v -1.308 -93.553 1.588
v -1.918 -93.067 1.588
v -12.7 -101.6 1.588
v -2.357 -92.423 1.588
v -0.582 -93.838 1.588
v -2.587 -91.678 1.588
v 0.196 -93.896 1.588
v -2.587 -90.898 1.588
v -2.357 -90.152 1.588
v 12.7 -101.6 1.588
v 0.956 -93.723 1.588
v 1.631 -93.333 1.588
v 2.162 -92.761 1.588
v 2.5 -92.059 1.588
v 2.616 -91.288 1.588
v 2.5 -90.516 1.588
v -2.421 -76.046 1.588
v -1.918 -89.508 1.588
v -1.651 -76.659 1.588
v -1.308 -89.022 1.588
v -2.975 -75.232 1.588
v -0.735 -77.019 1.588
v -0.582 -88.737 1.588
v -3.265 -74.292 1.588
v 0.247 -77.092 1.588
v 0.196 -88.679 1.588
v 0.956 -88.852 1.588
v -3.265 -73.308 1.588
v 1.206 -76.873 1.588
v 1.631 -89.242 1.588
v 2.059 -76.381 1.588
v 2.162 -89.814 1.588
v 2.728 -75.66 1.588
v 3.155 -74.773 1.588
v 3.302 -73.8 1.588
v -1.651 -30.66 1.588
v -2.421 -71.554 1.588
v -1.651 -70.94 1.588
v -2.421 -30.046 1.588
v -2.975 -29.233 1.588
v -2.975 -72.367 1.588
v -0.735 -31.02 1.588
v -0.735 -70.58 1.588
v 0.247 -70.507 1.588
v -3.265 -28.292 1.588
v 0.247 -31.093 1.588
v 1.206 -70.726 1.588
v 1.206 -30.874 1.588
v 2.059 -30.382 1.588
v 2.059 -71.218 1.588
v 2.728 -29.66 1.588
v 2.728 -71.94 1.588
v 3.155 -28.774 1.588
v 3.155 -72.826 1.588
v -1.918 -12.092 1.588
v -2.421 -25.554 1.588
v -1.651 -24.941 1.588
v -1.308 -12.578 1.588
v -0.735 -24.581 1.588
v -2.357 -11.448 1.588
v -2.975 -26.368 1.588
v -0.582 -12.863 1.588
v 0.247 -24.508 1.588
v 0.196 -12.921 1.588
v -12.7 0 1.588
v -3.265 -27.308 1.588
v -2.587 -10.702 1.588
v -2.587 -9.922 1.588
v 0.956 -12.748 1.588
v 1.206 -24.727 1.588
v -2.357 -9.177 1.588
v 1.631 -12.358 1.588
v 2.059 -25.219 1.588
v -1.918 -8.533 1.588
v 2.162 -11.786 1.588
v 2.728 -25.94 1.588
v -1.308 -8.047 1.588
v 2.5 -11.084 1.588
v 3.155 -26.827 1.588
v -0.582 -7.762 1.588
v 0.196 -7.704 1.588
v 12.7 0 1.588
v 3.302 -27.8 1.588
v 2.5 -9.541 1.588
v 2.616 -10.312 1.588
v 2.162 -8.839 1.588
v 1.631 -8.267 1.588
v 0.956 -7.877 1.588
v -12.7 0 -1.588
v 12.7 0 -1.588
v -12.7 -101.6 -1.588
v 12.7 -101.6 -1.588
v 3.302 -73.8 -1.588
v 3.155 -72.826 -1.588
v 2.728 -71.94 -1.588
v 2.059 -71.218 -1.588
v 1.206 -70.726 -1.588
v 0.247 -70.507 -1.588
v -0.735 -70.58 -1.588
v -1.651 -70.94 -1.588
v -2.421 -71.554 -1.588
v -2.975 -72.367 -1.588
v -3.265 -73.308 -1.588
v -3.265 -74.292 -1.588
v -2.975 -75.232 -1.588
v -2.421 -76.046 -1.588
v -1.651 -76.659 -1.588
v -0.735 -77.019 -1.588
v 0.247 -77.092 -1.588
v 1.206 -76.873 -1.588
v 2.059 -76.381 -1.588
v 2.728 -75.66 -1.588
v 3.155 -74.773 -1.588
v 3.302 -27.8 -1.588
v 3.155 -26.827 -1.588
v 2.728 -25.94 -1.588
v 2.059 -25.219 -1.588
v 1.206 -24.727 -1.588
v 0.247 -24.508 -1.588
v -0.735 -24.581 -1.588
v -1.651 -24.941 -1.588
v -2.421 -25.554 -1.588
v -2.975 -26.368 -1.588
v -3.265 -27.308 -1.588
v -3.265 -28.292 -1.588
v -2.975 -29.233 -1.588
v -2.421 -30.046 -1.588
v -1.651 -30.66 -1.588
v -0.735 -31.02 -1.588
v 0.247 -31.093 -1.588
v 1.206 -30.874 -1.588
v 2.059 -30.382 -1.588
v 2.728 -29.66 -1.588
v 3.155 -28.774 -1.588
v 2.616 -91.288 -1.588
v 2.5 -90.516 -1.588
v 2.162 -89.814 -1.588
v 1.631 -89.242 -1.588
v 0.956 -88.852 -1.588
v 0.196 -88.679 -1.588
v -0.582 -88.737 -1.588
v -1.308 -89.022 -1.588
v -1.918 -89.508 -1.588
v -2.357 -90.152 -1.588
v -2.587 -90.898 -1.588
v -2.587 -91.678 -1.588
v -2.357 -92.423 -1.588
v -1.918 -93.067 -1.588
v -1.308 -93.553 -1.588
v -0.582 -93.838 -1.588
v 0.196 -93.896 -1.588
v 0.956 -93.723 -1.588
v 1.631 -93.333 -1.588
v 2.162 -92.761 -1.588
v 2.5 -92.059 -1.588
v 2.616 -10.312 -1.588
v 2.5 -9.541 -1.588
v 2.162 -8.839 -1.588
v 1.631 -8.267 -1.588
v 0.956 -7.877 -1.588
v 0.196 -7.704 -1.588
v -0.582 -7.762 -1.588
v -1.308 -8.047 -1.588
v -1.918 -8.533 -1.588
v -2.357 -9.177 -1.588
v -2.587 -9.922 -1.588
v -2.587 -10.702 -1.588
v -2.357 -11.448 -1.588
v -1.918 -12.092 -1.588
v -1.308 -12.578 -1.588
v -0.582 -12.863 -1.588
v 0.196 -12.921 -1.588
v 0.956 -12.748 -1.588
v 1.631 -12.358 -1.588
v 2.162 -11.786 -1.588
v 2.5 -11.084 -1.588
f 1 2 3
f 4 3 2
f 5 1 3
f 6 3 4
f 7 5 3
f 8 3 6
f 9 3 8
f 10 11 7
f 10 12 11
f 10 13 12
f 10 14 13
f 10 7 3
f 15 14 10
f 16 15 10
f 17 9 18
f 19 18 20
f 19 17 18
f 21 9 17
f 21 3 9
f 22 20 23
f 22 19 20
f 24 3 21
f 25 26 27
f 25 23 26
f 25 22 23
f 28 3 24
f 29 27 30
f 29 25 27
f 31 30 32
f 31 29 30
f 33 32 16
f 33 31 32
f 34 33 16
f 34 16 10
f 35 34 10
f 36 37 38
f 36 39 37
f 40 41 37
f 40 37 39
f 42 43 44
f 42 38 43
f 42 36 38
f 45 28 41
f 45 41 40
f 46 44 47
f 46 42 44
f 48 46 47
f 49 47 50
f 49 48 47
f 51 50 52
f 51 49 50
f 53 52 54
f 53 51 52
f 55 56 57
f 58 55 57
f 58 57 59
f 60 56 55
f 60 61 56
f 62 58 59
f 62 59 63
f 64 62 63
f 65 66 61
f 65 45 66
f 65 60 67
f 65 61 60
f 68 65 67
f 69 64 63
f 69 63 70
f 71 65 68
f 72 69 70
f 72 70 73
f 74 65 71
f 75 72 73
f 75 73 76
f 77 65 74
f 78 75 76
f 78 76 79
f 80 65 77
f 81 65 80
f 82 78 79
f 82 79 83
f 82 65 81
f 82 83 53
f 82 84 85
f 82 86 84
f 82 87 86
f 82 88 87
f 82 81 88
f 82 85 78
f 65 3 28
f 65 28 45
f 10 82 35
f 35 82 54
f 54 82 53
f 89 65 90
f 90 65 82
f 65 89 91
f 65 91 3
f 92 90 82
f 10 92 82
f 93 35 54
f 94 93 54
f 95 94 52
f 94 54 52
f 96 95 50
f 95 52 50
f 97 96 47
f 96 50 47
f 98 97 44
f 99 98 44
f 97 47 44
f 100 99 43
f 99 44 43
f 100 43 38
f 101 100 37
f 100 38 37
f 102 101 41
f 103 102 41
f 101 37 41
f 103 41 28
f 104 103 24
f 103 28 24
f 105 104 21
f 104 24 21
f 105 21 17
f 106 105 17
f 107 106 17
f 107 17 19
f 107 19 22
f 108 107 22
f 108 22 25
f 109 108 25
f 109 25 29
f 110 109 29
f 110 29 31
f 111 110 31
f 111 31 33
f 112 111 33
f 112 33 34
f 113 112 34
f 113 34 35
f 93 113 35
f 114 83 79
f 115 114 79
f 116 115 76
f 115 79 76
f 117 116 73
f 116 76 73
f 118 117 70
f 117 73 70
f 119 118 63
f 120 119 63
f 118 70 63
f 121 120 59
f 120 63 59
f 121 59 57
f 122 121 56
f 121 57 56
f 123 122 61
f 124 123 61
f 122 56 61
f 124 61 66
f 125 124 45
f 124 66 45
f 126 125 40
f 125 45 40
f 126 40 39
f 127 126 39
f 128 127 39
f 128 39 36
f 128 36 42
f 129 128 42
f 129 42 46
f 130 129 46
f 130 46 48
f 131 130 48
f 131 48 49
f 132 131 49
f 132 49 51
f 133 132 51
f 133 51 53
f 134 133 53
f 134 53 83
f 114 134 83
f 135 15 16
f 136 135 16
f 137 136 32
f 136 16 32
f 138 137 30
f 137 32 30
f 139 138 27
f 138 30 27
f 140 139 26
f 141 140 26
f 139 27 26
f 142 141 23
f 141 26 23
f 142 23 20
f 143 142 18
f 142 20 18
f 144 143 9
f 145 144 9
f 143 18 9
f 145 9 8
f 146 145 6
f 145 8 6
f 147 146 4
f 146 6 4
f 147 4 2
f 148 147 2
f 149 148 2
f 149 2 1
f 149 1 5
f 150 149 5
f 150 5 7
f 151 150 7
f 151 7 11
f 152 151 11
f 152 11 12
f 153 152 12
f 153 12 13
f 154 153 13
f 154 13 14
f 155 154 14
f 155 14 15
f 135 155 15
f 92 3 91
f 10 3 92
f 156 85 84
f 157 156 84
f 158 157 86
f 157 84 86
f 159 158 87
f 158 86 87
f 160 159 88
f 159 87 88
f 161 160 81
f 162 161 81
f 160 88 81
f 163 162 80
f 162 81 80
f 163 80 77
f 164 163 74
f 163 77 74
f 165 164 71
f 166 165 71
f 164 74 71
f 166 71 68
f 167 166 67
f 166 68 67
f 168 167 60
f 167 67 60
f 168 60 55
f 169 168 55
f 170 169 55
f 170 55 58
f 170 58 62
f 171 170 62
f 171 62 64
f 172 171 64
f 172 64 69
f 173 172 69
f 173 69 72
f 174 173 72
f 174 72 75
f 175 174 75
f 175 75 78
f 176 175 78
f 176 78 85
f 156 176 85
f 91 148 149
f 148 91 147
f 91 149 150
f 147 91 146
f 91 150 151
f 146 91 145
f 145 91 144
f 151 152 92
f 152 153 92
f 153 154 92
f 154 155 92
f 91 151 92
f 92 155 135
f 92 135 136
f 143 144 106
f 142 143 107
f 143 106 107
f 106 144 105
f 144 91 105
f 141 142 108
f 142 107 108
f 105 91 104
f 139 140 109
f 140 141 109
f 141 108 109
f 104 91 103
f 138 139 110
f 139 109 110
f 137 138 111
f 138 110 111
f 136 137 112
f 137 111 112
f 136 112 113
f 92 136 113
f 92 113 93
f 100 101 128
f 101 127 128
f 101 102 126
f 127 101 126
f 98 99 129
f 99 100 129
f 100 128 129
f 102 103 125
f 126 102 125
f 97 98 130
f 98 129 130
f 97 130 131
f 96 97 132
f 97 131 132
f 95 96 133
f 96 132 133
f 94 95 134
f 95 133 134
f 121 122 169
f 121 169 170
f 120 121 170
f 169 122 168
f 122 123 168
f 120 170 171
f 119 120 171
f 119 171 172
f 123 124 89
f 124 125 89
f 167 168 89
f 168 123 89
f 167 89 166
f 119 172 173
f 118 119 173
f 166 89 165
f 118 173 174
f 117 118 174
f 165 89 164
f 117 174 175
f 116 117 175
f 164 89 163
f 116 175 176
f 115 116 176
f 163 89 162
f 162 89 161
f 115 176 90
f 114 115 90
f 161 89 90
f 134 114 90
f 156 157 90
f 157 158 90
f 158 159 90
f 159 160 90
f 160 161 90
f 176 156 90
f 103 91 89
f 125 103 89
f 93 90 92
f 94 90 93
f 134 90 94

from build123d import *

# Parameters (mm, degrees)
F0_W     = 25.4
F0_H     = 3.175
F1_DEPTH = 101.6
F2_R     = 2.6162
F2_R_2   = 3.302
F3_DEPTH = 3.176


with BuildPart() as f1:
    # F0 (on Front) → F1 (new body)
    with BuildSketch(Plane.XZ):
        Rectangle(F0_W, F0_H)
    extrude(amount=F1_DEPTH)

    # F2 (on face) → F3 (cut, through all)
    with BuildSketch(Plane.XY.offset(1.5875)):
        with Locations((0, -91.2876)):
            Circle(F2_R)
        with Locations((0, -10.3124)):
            Circle(F2_R)
        with Locations((0, -73.7997)):
            Circle(F2_R_2)
        with Locations((0, -27.8003)):
            Circle(F2_R_2)
    extrude(amount=-F3_DEPTH, mode=Mode.SUBTRACT)


solid = f1.part
